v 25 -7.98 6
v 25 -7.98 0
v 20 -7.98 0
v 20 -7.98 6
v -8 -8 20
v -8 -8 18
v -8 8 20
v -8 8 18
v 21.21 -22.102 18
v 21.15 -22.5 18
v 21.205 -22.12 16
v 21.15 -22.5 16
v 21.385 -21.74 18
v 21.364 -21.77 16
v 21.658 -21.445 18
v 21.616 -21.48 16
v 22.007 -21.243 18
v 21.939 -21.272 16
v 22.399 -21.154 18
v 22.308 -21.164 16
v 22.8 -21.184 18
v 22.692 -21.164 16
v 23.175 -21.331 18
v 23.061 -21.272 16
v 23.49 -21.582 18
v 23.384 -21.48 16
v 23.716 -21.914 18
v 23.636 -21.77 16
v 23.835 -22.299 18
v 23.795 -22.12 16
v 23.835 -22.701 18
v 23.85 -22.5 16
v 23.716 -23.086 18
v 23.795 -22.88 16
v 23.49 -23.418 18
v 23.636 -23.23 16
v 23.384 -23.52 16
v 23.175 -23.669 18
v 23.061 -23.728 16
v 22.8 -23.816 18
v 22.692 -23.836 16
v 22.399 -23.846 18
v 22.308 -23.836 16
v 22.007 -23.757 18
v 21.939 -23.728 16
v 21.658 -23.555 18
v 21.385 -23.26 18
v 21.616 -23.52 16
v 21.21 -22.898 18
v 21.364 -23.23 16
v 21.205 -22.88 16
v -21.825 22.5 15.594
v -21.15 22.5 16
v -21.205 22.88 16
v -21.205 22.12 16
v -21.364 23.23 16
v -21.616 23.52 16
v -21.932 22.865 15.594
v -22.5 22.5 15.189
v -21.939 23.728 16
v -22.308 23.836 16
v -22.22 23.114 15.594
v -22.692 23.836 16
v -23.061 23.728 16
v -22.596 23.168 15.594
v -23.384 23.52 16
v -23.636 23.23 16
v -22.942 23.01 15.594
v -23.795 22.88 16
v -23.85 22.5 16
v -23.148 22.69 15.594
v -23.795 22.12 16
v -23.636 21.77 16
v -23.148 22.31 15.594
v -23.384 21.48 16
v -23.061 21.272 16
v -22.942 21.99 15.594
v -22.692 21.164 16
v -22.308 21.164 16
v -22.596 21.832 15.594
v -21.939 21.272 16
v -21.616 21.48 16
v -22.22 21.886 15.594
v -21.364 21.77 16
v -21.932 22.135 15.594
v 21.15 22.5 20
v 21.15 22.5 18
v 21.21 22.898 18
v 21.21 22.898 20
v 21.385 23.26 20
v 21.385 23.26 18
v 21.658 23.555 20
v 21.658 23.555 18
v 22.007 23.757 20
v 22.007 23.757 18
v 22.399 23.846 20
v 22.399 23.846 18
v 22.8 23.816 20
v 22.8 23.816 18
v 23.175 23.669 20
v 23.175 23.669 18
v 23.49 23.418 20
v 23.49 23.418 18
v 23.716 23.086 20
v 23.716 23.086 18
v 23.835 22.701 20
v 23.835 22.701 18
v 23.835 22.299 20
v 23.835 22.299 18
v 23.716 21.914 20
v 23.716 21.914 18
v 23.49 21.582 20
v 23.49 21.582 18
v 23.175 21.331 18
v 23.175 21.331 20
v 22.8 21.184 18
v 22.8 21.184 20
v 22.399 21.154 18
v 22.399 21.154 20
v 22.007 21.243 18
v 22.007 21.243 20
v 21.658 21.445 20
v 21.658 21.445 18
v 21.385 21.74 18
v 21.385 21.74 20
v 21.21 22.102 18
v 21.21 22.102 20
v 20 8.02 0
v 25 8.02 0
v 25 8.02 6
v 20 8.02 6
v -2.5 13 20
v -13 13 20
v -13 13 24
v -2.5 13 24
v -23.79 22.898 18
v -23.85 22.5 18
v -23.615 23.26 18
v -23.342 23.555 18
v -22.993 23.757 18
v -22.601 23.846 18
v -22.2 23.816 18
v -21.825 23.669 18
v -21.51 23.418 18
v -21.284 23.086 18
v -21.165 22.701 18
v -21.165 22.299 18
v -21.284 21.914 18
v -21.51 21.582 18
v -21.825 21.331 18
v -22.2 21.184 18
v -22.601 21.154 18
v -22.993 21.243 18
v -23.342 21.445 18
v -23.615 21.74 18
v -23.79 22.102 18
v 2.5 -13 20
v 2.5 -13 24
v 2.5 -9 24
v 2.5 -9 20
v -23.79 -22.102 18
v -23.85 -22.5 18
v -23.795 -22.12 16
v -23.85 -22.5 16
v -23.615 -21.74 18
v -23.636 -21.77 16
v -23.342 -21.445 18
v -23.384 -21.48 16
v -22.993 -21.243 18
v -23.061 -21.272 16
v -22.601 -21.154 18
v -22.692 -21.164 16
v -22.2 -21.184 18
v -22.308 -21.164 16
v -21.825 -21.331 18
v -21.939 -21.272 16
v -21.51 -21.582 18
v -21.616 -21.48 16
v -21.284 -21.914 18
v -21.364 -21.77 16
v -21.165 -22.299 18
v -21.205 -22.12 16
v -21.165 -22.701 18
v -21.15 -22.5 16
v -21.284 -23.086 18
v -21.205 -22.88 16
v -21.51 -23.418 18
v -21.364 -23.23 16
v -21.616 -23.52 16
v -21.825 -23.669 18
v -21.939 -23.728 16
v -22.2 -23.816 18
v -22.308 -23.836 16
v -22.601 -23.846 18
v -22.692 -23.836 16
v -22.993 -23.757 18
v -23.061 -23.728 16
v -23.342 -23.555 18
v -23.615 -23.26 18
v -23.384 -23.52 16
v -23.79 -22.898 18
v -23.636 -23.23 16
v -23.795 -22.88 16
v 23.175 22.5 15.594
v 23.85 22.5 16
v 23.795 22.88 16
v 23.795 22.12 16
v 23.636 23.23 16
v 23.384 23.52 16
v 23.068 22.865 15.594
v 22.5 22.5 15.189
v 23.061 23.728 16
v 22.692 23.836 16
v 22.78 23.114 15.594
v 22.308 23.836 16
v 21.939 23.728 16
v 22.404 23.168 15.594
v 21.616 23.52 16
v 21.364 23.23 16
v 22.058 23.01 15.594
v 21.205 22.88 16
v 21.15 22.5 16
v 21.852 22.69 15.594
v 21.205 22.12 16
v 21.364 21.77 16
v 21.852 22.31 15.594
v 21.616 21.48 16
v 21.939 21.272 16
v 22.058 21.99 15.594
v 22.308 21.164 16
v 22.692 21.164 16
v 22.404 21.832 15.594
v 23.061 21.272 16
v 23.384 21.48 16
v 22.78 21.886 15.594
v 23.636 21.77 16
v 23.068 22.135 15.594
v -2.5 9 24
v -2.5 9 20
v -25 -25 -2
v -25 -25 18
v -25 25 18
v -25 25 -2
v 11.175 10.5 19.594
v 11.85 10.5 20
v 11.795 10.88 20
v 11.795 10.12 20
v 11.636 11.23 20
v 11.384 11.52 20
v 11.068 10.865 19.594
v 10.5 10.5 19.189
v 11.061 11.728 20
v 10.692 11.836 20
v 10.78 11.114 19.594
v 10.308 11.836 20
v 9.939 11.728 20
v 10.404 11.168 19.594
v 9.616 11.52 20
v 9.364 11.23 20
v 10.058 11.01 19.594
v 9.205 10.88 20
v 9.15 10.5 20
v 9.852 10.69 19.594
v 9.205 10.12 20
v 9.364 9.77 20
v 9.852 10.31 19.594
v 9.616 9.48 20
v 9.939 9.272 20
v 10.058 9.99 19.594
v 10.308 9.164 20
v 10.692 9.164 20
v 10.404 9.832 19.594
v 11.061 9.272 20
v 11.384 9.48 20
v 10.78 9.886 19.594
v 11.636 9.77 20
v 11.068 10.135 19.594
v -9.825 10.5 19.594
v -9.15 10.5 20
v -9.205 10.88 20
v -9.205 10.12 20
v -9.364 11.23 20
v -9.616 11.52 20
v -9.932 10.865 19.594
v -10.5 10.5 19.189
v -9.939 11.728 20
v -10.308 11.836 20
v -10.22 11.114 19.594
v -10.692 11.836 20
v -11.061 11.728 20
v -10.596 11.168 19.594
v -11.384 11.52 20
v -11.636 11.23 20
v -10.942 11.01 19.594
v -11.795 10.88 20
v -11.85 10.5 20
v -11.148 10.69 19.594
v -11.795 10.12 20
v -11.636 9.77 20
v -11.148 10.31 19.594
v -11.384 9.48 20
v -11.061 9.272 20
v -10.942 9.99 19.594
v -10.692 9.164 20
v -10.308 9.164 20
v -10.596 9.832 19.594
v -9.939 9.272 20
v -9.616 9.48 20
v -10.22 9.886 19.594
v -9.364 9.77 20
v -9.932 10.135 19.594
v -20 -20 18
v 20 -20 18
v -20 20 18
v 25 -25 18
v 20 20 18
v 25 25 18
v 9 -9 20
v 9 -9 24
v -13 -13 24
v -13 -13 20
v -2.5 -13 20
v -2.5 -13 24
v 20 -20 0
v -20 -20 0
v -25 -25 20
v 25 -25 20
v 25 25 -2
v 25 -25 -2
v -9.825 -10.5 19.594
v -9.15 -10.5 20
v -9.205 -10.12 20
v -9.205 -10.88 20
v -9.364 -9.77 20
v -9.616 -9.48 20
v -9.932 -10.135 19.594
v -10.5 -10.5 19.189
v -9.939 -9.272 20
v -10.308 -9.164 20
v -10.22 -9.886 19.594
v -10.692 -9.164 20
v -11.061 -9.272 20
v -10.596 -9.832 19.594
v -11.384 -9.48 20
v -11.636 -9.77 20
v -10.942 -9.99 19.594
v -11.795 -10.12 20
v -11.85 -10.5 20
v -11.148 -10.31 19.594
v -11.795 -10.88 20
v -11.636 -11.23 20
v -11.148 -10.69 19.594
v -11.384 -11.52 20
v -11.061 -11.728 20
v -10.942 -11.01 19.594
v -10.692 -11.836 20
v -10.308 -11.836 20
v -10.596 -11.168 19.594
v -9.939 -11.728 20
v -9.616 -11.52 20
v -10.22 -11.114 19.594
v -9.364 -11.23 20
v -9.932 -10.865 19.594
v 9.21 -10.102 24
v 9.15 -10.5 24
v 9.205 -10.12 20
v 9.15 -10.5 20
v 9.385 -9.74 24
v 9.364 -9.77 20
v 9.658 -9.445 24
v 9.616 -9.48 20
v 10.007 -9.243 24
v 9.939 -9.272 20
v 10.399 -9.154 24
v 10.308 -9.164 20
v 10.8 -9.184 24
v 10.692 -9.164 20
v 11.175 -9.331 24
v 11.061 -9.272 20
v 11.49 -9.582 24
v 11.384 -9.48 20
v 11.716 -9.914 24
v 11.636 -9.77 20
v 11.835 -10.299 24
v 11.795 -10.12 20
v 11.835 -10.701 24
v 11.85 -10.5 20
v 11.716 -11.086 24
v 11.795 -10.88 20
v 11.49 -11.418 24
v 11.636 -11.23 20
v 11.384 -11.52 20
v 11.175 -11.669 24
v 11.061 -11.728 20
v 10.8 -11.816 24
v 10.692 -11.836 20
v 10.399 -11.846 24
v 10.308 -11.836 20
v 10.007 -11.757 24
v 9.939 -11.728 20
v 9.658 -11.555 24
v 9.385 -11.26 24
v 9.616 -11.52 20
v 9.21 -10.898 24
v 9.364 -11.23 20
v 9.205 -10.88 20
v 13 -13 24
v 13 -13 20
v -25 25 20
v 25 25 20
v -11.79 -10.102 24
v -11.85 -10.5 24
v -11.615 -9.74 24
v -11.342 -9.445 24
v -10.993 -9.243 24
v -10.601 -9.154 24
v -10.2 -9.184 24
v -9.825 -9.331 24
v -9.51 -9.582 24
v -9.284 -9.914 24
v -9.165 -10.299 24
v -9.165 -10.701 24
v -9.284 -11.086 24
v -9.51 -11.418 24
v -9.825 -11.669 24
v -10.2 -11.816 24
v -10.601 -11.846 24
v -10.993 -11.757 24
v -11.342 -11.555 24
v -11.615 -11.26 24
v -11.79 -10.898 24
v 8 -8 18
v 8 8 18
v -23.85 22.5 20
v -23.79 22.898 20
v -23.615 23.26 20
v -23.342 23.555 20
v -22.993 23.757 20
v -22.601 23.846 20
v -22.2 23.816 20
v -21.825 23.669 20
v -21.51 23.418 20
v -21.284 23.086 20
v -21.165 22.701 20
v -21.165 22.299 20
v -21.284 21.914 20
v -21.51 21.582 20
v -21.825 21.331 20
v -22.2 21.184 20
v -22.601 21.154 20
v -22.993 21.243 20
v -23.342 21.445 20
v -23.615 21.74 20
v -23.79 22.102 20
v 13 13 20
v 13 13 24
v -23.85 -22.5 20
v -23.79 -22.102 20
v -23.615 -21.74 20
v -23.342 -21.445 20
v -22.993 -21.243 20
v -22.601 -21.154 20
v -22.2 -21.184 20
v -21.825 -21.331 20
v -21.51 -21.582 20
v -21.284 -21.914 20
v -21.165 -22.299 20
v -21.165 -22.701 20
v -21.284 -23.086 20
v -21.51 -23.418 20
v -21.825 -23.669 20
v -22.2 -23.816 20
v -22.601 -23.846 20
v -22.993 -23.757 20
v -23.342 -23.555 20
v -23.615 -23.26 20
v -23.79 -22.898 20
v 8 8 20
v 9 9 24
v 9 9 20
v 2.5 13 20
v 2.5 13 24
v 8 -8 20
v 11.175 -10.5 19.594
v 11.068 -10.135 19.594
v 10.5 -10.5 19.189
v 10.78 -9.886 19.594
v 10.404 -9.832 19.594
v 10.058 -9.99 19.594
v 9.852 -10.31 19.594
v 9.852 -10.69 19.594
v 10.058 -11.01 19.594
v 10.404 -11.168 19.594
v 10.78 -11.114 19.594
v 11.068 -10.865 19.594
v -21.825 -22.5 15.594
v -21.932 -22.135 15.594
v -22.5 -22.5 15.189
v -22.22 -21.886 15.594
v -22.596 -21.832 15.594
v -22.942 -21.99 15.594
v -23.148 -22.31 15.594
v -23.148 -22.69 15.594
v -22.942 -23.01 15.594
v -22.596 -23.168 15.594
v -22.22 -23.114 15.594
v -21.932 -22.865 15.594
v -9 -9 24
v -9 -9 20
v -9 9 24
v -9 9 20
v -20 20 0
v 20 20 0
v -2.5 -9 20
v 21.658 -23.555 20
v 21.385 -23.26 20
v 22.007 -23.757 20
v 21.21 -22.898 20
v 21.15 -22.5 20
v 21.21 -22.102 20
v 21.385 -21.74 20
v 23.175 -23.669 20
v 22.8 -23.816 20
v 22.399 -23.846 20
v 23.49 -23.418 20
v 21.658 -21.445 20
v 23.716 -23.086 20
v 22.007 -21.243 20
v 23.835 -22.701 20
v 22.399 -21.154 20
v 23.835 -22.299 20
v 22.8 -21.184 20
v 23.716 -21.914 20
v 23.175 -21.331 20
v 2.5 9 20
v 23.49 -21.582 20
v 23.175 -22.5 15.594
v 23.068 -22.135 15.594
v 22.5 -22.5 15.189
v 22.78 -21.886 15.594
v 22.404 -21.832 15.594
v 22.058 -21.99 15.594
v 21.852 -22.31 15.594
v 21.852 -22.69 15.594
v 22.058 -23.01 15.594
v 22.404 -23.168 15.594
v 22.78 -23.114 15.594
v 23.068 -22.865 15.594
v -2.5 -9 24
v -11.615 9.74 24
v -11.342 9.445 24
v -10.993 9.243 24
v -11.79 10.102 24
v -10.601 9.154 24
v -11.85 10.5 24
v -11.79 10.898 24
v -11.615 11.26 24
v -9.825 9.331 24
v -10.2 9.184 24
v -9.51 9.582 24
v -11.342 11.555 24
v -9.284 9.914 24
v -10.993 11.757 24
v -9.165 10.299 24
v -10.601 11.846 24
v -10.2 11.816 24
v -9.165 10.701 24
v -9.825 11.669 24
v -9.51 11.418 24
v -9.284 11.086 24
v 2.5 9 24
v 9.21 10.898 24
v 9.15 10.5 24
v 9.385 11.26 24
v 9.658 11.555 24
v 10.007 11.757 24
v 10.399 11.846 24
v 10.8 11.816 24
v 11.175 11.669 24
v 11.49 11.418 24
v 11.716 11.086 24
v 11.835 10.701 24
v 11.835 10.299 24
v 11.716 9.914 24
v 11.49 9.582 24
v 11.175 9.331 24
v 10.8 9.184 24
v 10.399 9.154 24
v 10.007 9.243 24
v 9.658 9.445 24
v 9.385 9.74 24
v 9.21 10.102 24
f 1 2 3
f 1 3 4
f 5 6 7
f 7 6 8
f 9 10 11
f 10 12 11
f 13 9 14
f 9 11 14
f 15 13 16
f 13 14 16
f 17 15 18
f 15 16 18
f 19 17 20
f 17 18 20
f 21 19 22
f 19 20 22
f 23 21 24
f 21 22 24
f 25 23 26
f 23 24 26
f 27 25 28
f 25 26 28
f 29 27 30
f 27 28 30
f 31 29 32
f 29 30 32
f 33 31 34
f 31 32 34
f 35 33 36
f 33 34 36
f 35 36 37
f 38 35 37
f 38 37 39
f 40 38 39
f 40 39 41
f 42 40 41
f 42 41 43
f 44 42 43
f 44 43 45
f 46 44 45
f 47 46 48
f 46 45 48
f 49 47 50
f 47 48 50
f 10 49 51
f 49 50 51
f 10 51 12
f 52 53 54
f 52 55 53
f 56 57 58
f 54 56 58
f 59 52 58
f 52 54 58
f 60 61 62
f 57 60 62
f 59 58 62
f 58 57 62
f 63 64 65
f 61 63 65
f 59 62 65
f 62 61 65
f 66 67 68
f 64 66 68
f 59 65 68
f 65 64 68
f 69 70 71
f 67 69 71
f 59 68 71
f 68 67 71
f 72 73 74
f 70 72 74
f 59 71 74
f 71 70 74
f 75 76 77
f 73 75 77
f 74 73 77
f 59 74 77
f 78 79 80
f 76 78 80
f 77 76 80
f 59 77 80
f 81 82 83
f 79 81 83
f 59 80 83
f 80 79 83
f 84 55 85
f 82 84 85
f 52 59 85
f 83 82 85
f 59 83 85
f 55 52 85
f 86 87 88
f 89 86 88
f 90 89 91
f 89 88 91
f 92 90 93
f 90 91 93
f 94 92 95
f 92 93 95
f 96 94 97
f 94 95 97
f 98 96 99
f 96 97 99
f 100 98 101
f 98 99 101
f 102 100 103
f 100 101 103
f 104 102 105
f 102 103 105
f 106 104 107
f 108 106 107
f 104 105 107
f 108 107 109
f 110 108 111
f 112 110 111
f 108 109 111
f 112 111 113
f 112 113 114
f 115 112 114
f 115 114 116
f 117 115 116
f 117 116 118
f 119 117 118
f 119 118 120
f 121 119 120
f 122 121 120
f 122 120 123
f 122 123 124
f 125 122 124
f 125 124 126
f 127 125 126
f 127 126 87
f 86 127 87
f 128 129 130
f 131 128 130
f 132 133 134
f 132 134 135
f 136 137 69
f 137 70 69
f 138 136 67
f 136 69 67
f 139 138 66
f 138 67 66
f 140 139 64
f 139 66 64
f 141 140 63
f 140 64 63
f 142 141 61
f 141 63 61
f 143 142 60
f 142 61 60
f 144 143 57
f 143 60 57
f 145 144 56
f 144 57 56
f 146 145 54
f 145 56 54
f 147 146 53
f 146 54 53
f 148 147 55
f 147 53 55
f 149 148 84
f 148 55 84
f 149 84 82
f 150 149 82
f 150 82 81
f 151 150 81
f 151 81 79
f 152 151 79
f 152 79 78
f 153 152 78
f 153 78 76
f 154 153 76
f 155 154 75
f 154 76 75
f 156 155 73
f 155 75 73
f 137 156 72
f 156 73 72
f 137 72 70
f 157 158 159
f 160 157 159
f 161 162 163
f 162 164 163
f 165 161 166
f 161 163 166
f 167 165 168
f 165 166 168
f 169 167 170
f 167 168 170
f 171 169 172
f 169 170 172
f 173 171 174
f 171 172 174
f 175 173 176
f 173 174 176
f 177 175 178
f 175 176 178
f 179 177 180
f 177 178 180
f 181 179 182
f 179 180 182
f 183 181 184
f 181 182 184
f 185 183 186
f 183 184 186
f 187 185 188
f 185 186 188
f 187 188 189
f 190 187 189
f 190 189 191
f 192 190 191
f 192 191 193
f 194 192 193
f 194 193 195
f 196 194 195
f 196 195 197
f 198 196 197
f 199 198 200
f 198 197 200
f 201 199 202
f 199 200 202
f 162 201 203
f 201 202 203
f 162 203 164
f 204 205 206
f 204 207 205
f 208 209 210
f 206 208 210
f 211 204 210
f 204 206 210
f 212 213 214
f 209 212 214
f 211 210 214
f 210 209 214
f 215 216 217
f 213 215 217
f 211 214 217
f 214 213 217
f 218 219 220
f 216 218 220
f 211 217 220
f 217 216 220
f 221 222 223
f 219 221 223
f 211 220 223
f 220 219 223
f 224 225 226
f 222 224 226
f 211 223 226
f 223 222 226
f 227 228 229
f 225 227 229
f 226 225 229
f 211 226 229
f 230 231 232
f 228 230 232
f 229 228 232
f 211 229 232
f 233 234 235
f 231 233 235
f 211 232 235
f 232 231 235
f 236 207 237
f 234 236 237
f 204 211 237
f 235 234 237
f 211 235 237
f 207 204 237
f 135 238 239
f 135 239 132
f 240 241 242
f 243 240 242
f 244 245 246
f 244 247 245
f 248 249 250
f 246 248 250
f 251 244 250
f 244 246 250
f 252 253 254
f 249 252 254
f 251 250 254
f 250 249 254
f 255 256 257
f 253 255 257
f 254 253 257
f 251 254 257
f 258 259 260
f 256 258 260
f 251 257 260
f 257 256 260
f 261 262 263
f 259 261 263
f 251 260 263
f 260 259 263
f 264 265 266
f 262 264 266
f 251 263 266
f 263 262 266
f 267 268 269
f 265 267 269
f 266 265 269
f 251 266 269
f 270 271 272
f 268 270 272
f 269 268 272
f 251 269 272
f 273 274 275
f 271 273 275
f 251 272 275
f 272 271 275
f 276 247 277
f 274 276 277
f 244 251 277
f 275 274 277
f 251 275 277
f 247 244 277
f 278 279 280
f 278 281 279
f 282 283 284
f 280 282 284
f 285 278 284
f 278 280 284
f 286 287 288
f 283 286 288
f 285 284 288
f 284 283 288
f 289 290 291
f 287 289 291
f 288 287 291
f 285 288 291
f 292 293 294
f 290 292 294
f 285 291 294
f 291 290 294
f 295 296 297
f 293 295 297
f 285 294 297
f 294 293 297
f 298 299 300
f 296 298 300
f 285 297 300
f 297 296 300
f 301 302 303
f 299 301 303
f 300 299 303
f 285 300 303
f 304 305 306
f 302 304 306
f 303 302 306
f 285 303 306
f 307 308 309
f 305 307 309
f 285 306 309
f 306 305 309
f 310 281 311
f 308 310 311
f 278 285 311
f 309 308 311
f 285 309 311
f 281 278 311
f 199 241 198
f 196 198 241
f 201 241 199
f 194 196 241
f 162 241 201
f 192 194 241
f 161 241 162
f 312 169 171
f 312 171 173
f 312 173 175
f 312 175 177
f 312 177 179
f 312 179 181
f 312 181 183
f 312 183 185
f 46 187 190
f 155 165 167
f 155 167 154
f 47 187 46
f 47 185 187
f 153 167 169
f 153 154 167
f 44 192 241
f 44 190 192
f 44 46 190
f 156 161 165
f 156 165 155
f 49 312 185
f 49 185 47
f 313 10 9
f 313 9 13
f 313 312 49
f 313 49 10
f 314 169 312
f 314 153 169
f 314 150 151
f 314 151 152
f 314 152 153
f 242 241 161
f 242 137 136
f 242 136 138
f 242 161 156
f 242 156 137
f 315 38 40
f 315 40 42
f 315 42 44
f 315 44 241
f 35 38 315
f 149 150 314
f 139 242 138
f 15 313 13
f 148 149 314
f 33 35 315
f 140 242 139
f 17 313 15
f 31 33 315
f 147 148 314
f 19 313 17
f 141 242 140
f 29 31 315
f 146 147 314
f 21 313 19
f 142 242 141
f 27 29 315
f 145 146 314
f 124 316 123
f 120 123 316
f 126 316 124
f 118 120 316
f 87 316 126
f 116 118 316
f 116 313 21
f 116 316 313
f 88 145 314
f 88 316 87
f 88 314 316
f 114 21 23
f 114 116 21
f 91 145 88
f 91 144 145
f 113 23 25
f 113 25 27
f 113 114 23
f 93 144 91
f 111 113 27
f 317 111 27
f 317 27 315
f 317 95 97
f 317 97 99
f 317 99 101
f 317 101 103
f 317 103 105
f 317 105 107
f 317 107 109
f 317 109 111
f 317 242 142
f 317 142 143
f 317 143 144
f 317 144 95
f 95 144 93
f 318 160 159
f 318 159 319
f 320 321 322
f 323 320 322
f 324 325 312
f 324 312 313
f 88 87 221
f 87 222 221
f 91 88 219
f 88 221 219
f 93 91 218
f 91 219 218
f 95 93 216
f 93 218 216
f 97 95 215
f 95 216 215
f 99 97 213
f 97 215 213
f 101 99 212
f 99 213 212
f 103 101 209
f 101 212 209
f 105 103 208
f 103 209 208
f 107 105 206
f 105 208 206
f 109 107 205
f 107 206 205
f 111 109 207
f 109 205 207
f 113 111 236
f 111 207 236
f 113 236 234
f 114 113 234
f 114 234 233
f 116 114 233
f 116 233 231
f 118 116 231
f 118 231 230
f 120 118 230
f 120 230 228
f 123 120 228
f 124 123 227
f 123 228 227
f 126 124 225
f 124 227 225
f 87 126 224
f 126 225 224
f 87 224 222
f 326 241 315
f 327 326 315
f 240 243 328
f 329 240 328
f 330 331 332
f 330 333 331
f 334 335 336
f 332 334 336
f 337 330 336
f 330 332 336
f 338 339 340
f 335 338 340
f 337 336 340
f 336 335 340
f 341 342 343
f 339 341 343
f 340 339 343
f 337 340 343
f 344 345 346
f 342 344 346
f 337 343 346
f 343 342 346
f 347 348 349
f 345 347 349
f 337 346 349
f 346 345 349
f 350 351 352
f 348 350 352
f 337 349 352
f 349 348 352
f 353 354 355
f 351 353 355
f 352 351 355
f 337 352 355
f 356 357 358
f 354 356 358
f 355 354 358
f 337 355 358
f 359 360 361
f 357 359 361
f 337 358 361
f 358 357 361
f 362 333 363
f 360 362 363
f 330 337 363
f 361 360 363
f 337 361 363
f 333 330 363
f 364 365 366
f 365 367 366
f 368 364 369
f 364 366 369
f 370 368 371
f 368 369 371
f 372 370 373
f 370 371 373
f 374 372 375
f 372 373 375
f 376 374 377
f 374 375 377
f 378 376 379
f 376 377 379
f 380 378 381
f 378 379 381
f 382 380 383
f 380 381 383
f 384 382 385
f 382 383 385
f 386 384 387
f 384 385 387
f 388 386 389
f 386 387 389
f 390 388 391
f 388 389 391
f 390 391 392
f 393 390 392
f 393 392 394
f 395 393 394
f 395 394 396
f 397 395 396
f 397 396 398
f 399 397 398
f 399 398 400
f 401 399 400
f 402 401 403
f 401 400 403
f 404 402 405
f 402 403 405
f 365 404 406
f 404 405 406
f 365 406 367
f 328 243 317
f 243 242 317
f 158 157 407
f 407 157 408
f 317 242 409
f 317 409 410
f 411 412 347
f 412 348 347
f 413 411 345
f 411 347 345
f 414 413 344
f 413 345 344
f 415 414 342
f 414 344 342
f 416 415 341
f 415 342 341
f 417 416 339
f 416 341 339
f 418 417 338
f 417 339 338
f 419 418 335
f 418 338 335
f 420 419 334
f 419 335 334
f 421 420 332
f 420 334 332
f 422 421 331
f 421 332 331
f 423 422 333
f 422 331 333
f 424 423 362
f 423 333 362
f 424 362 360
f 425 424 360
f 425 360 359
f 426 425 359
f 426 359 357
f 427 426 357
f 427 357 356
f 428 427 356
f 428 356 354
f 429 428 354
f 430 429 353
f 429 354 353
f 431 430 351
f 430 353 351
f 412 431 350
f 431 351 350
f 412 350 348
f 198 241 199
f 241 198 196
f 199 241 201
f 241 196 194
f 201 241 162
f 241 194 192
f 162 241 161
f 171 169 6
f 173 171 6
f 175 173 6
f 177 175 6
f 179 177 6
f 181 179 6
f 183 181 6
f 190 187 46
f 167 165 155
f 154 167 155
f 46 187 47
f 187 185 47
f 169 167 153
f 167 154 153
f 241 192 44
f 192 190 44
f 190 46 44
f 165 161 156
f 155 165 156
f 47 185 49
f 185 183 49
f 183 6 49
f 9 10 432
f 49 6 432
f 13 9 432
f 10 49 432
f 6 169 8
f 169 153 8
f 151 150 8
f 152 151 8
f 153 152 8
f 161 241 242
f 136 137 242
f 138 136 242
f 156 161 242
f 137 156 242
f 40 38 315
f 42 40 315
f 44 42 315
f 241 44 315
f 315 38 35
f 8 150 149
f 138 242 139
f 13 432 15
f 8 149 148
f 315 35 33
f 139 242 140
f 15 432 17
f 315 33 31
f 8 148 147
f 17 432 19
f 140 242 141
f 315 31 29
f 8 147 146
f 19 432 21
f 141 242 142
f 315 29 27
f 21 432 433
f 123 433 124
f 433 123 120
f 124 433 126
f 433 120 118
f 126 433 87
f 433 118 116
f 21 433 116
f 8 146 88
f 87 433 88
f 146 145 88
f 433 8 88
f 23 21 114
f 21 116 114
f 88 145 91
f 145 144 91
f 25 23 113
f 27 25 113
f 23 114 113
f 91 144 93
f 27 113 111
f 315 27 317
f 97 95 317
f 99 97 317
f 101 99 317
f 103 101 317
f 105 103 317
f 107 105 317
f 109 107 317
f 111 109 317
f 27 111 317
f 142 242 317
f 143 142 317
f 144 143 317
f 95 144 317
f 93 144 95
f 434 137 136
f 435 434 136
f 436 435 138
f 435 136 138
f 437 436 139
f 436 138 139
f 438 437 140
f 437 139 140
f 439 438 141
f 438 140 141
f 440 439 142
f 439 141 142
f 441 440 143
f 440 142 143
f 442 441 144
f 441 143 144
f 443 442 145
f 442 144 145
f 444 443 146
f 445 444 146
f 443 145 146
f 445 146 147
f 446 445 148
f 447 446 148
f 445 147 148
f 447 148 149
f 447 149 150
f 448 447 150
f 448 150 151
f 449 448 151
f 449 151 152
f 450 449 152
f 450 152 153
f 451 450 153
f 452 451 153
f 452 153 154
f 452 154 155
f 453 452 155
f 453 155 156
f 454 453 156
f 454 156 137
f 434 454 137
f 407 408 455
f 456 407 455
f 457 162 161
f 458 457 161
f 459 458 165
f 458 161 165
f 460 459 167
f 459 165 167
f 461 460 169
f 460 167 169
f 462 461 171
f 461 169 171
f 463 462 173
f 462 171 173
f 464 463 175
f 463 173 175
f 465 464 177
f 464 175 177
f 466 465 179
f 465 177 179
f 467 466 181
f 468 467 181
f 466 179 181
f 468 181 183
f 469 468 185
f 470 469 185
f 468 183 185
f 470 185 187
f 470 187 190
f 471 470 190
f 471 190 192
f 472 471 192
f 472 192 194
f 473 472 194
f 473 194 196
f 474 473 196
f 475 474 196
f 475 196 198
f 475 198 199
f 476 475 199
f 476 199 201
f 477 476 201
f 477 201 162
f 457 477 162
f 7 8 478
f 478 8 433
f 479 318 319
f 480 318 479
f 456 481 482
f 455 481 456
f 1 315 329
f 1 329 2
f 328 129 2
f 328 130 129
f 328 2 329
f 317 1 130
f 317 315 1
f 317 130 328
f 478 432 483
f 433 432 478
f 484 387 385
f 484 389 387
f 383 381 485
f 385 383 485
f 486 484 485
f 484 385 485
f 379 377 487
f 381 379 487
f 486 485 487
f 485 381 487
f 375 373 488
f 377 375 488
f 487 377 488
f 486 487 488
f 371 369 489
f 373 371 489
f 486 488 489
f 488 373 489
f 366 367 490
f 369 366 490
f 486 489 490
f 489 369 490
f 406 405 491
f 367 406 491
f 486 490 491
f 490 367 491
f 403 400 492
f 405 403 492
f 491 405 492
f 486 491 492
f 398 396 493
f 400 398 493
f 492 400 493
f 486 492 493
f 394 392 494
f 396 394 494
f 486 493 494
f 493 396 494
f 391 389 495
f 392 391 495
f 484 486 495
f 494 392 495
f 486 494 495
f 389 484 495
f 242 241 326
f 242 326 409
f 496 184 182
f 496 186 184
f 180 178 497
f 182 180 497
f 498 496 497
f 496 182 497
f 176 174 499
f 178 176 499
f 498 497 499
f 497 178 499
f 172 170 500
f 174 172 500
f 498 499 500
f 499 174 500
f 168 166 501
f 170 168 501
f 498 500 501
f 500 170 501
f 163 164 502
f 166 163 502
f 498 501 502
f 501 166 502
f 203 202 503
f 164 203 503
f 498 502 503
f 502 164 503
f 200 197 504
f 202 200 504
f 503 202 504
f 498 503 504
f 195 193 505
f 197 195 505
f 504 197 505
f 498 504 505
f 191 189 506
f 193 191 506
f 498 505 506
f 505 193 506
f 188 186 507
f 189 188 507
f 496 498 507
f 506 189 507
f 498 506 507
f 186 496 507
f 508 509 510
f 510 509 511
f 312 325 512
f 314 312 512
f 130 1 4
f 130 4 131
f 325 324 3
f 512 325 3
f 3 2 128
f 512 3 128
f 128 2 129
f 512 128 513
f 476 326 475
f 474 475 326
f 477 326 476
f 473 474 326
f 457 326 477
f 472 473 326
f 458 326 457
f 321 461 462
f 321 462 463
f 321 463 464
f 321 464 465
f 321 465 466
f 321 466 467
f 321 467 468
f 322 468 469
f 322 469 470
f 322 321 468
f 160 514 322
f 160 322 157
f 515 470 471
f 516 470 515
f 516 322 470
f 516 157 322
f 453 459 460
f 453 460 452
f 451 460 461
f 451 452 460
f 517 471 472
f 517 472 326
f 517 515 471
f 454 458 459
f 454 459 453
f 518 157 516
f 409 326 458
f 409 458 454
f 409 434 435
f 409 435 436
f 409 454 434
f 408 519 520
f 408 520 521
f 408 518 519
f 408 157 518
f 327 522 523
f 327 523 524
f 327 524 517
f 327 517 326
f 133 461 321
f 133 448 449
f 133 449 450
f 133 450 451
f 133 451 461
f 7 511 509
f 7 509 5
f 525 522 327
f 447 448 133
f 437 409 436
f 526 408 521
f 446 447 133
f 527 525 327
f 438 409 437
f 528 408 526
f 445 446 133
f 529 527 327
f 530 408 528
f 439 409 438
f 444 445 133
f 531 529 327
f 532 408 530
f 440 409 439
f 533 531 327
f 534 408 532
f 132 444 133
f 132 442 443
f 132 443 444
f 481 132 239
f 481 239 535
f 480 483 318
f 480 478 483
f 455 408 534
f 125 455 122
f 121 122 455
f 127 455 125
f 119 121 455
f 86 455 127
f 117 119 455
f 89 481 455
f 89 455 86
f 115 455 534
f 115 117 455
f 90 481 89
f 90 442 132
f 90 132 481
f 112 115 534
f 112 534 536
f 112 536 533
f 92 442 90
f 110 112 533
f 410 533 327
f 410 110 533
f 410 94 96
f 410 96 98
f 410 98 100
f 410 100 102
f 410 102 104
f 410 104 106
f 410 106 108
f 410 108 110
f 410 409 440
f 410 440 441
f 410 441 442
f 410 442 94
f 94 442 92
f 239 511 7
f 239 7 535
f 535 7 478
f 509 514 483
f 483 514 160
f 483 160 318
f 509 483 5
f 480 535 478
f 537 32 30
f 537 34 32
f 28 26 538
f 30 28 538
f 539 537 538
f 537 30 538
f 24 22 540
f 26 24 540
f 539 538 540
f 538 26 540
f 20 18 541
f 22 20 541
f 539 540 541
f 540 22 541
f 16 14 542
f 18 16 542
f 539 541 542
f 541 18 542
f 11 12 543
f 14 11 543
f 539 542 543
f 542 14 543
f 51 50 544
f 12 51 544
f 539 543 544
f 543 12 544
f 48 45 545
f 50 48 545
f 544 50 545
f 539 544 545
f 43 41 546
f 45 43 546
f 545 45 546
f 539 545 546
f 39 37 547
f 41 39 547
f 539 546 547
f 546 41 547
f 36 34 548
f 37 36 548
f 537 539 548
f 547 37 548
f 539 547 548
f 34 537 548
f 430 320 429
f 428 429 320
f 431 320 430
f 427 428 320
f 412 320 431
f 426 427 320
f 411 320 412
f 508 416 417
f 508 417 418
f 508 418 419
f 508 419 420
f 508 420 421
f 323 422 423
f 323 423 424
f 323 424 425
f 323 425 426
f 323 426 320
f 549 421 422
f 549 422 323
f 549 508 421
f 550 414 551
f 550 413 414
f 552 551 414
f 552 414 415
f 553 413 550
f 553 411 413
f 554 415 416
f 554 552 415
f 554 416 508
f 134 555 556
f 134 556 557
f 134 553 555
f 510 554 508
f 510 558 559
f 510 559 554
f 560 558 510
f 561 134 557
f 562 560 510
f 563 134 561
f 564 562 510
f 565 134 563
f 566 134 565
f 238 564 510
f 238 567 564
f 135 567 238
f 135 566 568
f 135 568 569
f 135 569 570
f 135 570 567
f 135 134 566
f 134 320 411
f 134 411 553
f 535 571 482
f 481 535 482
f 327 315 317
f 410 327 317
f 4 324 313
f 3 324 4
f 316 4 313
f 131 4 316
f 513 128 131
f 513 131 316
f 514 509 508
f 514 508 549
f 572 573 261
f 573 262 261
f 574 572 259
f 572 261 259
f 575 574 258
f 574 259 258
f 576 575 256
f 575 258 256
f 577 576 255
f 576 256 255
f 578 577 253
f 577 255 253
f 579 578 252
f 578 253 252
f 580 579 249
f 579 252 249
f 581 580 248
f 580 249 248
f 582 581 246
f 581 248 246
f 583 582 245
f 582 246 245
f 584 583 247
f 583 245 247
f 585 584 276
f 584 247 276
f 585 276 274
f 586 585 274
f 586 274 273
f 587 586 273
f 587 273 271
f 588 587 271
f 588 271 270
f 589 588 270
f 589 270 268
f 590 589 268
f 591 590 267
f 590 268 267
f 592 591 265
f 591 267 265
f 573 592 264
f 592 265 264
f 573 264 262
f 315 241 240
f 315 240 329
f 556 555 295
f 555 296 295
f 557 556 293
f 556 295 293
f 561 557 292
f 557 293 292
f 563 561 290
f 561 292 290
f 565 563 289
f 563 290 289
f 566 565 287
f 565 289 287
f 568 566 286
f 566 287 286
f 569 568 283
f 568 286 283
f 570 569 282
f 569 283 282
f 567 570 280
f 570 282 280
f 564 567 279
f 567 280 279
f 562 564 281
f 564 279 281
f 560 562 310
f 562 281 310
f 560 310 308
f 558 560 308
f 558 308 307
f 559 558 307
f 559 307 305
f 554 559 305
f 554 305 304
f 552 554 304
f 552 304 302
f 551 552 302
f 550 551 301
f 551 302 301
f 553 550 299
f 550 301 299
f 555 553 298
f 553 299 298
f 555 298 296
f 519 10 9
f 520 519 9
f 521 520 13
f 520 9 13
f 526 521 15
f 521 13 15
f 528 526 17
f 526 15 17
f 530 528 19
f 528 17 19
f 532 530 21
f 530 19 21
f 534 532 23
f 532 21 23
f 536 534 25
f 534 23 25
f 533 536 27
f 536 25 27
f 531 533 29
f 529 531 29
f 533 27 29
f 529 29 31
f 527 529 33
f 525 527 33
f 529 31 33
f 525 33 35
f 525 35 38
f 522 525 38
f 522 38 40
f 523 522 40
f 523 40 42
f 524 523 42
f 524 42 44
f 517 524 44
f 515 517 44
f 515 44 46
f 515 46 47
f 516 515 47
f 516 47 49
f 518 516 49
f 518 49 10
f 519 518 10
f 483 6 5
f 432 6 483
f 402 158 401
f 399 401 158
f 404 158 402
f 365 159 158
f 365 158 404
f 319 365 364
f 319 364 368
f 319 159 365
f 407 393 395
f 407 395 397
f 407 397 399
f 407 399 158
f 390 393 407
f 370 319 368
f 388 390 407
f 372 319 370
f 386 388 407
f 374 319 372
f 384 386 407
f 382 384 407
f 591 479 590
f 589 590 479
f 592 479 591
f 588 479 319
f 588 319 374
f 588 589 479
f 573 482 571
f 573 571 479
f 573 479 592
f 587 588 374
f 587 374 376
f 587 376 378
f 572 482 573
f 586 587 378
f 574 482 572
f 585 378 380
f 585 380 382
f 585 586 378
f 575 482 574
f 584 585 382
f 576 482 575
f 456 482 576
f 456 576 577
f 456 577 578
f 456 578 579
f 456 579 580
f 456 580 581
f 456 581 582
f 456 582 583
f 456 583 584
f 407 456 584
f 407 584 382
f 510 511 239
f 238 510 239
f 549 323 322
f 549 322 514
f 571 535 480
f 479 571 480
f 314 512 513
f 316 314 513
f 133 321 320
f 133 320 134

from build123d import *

# Parameters (mm, degrees)
F0_W        = 50
F0_H        = 50
F0_W_2      = 40
F0_H_2      = 40
F1_DEPTH    = 18
F2_DEPTH    = 2
F3_W        = 16
F3_H        = 6
F4_DEPTH    = 5
F5_W        = 50
F5_H        = 50
F5_W_2      = 40
F5_H_2      = 40
F5_W_3      = 16
F5_H_3      = 16
F6_DEPTH    = 2
F7_W        = 26
F7_H        = 26
F7_W_2      = 18
F7_H_2      = 18
F8_DEPTH    = 4
F10_D       = 2.7
F10_DEPTH   = 4
F10_TIP     = 0.8111618357
F9_W        = 5
F9_H        = 4
F11_DEPTH   = 4
F13_D       = 2.7
F13_DEPTH   = 4
F13_TIP     = 0.8111618357
F13_2_D     = 2.7
F13_2_DEPTH = 4
F13_2_TIP   = 0.8111618357


with BuildPart() as f1:
    # F0 (on Top) → F1 (new body)
    with BuildSketch(Plane.XY):
        Rectangle(F0_W, F0_H)
        Rectangle(F0_W_2, F0_H_2, mode=Mode.SUBTRACT)
    extrude(amount=F1_DEPTH)

    # F0 (on Top) → F2 (join)
    with BuildSketch(Plane.XY):
        Rectangle(F0_W, F0_H)
        Rectangle(F0_W_2, F0_H_2, mode=Mode.SUBTRACT)
        Rectangle(F0_W_2, F0_H_2)
    extrude(amount=-F2_DEPTH)

    # F3 (on face) → F4 (cut, through all)
    with BuildSketch(Plane.YZ.offset(25)):
        with Locations((0.0201961273, 3)):
            Rectangle(F3_W, F3_H)
    extrude(amount=-F4_DEPTH, mode=Mode.SUBTRACT)

    # F13
    with Locations(Plane.XY.offset(20)):
        with Locations((-22.5, 22.5), (22.5, 22.5), (-22.5, -22.5), (22.5, -22.5)):
            Hole(F13_D / 2, depth=F13_DEPTH)
            with Locations((0, 0, -(F13_DEPTH + F13_TIP / 2))):  # 118° drill point
                Cone(0, F13_D / 2, F13_TIP, mode=Mode.SUBTRACT)


with BuildPart() as f6:
    # F5 (on face) → F6 (new body)
    with BuildSketch(Plane.XY.offset(18)):
        Rectangle(F5_W, F5_H)
        Rectangle(F5_W_2, F5_H_2, mode=Mode.SUBTRACT)
        Rectangle(F5_W_2, F5_H_2)
        Rectangle(F5_W_3, F5_H_3, mode=Mode.SUBTRACT)
    extrude(amount=F6_DEPTH)

    # F7 (on face) → F8 (join)
    with BuildSketch(Plane.XY.offset(20)):
        Rectangle(F7_W, F7_H)
        Rectangle(F7_W_2, F7_H_2, mode=Mode.SUBTRACT)
    extrude(amount=F8_DEPTH)

    # F10
    with Locations(Plane.XY.offset(24)):
        with Locations((-10.5, 10.5), (10.5, 10.5), (-10.5, -10.5), (10.5, -10.5)):
            Hole(F10_D / 2, depth=F10_DEPTH)
            with Locations((0, 0, -(F10_DEPTH + F10_TIP / 2))):  # 118° drill point
                Cone(0, F10_D / 2, F10_TIP, mode=Mode.SUBTRACT)

    # F9 (on face) → F11 (cut, through all)
    with BuildSketch(Plane.XY.offset(24)):
        with Locations((0, 11)):
            Rectangle(F9_W, F9_H)
        with Locations((0, -11)):
            Rectangle(F9_W, F9_H)
    extrude(amount=-F11_DEPTH, mode=Mode.SUBTRACT)

    # F13#2
    with Locations(Plane.XY.offset(20)):
        with Locations((-22.5, 22.5), (22.5, 22.5), (-22.5, -22.5), (22.5, -22.5)):
            Hole(F13_2_D / 2, depth=F13_2_DEPTH)
            with Locations((0, 0, -(F13_2_DEPTH + F13_2_TIP / 2))):  # 118° drill point
                Cone(0, F13_2_D / 2, F13_2_TIP, mode=Mode.SUBTRACT)


solid = Compound([f1.part, f6.part])
